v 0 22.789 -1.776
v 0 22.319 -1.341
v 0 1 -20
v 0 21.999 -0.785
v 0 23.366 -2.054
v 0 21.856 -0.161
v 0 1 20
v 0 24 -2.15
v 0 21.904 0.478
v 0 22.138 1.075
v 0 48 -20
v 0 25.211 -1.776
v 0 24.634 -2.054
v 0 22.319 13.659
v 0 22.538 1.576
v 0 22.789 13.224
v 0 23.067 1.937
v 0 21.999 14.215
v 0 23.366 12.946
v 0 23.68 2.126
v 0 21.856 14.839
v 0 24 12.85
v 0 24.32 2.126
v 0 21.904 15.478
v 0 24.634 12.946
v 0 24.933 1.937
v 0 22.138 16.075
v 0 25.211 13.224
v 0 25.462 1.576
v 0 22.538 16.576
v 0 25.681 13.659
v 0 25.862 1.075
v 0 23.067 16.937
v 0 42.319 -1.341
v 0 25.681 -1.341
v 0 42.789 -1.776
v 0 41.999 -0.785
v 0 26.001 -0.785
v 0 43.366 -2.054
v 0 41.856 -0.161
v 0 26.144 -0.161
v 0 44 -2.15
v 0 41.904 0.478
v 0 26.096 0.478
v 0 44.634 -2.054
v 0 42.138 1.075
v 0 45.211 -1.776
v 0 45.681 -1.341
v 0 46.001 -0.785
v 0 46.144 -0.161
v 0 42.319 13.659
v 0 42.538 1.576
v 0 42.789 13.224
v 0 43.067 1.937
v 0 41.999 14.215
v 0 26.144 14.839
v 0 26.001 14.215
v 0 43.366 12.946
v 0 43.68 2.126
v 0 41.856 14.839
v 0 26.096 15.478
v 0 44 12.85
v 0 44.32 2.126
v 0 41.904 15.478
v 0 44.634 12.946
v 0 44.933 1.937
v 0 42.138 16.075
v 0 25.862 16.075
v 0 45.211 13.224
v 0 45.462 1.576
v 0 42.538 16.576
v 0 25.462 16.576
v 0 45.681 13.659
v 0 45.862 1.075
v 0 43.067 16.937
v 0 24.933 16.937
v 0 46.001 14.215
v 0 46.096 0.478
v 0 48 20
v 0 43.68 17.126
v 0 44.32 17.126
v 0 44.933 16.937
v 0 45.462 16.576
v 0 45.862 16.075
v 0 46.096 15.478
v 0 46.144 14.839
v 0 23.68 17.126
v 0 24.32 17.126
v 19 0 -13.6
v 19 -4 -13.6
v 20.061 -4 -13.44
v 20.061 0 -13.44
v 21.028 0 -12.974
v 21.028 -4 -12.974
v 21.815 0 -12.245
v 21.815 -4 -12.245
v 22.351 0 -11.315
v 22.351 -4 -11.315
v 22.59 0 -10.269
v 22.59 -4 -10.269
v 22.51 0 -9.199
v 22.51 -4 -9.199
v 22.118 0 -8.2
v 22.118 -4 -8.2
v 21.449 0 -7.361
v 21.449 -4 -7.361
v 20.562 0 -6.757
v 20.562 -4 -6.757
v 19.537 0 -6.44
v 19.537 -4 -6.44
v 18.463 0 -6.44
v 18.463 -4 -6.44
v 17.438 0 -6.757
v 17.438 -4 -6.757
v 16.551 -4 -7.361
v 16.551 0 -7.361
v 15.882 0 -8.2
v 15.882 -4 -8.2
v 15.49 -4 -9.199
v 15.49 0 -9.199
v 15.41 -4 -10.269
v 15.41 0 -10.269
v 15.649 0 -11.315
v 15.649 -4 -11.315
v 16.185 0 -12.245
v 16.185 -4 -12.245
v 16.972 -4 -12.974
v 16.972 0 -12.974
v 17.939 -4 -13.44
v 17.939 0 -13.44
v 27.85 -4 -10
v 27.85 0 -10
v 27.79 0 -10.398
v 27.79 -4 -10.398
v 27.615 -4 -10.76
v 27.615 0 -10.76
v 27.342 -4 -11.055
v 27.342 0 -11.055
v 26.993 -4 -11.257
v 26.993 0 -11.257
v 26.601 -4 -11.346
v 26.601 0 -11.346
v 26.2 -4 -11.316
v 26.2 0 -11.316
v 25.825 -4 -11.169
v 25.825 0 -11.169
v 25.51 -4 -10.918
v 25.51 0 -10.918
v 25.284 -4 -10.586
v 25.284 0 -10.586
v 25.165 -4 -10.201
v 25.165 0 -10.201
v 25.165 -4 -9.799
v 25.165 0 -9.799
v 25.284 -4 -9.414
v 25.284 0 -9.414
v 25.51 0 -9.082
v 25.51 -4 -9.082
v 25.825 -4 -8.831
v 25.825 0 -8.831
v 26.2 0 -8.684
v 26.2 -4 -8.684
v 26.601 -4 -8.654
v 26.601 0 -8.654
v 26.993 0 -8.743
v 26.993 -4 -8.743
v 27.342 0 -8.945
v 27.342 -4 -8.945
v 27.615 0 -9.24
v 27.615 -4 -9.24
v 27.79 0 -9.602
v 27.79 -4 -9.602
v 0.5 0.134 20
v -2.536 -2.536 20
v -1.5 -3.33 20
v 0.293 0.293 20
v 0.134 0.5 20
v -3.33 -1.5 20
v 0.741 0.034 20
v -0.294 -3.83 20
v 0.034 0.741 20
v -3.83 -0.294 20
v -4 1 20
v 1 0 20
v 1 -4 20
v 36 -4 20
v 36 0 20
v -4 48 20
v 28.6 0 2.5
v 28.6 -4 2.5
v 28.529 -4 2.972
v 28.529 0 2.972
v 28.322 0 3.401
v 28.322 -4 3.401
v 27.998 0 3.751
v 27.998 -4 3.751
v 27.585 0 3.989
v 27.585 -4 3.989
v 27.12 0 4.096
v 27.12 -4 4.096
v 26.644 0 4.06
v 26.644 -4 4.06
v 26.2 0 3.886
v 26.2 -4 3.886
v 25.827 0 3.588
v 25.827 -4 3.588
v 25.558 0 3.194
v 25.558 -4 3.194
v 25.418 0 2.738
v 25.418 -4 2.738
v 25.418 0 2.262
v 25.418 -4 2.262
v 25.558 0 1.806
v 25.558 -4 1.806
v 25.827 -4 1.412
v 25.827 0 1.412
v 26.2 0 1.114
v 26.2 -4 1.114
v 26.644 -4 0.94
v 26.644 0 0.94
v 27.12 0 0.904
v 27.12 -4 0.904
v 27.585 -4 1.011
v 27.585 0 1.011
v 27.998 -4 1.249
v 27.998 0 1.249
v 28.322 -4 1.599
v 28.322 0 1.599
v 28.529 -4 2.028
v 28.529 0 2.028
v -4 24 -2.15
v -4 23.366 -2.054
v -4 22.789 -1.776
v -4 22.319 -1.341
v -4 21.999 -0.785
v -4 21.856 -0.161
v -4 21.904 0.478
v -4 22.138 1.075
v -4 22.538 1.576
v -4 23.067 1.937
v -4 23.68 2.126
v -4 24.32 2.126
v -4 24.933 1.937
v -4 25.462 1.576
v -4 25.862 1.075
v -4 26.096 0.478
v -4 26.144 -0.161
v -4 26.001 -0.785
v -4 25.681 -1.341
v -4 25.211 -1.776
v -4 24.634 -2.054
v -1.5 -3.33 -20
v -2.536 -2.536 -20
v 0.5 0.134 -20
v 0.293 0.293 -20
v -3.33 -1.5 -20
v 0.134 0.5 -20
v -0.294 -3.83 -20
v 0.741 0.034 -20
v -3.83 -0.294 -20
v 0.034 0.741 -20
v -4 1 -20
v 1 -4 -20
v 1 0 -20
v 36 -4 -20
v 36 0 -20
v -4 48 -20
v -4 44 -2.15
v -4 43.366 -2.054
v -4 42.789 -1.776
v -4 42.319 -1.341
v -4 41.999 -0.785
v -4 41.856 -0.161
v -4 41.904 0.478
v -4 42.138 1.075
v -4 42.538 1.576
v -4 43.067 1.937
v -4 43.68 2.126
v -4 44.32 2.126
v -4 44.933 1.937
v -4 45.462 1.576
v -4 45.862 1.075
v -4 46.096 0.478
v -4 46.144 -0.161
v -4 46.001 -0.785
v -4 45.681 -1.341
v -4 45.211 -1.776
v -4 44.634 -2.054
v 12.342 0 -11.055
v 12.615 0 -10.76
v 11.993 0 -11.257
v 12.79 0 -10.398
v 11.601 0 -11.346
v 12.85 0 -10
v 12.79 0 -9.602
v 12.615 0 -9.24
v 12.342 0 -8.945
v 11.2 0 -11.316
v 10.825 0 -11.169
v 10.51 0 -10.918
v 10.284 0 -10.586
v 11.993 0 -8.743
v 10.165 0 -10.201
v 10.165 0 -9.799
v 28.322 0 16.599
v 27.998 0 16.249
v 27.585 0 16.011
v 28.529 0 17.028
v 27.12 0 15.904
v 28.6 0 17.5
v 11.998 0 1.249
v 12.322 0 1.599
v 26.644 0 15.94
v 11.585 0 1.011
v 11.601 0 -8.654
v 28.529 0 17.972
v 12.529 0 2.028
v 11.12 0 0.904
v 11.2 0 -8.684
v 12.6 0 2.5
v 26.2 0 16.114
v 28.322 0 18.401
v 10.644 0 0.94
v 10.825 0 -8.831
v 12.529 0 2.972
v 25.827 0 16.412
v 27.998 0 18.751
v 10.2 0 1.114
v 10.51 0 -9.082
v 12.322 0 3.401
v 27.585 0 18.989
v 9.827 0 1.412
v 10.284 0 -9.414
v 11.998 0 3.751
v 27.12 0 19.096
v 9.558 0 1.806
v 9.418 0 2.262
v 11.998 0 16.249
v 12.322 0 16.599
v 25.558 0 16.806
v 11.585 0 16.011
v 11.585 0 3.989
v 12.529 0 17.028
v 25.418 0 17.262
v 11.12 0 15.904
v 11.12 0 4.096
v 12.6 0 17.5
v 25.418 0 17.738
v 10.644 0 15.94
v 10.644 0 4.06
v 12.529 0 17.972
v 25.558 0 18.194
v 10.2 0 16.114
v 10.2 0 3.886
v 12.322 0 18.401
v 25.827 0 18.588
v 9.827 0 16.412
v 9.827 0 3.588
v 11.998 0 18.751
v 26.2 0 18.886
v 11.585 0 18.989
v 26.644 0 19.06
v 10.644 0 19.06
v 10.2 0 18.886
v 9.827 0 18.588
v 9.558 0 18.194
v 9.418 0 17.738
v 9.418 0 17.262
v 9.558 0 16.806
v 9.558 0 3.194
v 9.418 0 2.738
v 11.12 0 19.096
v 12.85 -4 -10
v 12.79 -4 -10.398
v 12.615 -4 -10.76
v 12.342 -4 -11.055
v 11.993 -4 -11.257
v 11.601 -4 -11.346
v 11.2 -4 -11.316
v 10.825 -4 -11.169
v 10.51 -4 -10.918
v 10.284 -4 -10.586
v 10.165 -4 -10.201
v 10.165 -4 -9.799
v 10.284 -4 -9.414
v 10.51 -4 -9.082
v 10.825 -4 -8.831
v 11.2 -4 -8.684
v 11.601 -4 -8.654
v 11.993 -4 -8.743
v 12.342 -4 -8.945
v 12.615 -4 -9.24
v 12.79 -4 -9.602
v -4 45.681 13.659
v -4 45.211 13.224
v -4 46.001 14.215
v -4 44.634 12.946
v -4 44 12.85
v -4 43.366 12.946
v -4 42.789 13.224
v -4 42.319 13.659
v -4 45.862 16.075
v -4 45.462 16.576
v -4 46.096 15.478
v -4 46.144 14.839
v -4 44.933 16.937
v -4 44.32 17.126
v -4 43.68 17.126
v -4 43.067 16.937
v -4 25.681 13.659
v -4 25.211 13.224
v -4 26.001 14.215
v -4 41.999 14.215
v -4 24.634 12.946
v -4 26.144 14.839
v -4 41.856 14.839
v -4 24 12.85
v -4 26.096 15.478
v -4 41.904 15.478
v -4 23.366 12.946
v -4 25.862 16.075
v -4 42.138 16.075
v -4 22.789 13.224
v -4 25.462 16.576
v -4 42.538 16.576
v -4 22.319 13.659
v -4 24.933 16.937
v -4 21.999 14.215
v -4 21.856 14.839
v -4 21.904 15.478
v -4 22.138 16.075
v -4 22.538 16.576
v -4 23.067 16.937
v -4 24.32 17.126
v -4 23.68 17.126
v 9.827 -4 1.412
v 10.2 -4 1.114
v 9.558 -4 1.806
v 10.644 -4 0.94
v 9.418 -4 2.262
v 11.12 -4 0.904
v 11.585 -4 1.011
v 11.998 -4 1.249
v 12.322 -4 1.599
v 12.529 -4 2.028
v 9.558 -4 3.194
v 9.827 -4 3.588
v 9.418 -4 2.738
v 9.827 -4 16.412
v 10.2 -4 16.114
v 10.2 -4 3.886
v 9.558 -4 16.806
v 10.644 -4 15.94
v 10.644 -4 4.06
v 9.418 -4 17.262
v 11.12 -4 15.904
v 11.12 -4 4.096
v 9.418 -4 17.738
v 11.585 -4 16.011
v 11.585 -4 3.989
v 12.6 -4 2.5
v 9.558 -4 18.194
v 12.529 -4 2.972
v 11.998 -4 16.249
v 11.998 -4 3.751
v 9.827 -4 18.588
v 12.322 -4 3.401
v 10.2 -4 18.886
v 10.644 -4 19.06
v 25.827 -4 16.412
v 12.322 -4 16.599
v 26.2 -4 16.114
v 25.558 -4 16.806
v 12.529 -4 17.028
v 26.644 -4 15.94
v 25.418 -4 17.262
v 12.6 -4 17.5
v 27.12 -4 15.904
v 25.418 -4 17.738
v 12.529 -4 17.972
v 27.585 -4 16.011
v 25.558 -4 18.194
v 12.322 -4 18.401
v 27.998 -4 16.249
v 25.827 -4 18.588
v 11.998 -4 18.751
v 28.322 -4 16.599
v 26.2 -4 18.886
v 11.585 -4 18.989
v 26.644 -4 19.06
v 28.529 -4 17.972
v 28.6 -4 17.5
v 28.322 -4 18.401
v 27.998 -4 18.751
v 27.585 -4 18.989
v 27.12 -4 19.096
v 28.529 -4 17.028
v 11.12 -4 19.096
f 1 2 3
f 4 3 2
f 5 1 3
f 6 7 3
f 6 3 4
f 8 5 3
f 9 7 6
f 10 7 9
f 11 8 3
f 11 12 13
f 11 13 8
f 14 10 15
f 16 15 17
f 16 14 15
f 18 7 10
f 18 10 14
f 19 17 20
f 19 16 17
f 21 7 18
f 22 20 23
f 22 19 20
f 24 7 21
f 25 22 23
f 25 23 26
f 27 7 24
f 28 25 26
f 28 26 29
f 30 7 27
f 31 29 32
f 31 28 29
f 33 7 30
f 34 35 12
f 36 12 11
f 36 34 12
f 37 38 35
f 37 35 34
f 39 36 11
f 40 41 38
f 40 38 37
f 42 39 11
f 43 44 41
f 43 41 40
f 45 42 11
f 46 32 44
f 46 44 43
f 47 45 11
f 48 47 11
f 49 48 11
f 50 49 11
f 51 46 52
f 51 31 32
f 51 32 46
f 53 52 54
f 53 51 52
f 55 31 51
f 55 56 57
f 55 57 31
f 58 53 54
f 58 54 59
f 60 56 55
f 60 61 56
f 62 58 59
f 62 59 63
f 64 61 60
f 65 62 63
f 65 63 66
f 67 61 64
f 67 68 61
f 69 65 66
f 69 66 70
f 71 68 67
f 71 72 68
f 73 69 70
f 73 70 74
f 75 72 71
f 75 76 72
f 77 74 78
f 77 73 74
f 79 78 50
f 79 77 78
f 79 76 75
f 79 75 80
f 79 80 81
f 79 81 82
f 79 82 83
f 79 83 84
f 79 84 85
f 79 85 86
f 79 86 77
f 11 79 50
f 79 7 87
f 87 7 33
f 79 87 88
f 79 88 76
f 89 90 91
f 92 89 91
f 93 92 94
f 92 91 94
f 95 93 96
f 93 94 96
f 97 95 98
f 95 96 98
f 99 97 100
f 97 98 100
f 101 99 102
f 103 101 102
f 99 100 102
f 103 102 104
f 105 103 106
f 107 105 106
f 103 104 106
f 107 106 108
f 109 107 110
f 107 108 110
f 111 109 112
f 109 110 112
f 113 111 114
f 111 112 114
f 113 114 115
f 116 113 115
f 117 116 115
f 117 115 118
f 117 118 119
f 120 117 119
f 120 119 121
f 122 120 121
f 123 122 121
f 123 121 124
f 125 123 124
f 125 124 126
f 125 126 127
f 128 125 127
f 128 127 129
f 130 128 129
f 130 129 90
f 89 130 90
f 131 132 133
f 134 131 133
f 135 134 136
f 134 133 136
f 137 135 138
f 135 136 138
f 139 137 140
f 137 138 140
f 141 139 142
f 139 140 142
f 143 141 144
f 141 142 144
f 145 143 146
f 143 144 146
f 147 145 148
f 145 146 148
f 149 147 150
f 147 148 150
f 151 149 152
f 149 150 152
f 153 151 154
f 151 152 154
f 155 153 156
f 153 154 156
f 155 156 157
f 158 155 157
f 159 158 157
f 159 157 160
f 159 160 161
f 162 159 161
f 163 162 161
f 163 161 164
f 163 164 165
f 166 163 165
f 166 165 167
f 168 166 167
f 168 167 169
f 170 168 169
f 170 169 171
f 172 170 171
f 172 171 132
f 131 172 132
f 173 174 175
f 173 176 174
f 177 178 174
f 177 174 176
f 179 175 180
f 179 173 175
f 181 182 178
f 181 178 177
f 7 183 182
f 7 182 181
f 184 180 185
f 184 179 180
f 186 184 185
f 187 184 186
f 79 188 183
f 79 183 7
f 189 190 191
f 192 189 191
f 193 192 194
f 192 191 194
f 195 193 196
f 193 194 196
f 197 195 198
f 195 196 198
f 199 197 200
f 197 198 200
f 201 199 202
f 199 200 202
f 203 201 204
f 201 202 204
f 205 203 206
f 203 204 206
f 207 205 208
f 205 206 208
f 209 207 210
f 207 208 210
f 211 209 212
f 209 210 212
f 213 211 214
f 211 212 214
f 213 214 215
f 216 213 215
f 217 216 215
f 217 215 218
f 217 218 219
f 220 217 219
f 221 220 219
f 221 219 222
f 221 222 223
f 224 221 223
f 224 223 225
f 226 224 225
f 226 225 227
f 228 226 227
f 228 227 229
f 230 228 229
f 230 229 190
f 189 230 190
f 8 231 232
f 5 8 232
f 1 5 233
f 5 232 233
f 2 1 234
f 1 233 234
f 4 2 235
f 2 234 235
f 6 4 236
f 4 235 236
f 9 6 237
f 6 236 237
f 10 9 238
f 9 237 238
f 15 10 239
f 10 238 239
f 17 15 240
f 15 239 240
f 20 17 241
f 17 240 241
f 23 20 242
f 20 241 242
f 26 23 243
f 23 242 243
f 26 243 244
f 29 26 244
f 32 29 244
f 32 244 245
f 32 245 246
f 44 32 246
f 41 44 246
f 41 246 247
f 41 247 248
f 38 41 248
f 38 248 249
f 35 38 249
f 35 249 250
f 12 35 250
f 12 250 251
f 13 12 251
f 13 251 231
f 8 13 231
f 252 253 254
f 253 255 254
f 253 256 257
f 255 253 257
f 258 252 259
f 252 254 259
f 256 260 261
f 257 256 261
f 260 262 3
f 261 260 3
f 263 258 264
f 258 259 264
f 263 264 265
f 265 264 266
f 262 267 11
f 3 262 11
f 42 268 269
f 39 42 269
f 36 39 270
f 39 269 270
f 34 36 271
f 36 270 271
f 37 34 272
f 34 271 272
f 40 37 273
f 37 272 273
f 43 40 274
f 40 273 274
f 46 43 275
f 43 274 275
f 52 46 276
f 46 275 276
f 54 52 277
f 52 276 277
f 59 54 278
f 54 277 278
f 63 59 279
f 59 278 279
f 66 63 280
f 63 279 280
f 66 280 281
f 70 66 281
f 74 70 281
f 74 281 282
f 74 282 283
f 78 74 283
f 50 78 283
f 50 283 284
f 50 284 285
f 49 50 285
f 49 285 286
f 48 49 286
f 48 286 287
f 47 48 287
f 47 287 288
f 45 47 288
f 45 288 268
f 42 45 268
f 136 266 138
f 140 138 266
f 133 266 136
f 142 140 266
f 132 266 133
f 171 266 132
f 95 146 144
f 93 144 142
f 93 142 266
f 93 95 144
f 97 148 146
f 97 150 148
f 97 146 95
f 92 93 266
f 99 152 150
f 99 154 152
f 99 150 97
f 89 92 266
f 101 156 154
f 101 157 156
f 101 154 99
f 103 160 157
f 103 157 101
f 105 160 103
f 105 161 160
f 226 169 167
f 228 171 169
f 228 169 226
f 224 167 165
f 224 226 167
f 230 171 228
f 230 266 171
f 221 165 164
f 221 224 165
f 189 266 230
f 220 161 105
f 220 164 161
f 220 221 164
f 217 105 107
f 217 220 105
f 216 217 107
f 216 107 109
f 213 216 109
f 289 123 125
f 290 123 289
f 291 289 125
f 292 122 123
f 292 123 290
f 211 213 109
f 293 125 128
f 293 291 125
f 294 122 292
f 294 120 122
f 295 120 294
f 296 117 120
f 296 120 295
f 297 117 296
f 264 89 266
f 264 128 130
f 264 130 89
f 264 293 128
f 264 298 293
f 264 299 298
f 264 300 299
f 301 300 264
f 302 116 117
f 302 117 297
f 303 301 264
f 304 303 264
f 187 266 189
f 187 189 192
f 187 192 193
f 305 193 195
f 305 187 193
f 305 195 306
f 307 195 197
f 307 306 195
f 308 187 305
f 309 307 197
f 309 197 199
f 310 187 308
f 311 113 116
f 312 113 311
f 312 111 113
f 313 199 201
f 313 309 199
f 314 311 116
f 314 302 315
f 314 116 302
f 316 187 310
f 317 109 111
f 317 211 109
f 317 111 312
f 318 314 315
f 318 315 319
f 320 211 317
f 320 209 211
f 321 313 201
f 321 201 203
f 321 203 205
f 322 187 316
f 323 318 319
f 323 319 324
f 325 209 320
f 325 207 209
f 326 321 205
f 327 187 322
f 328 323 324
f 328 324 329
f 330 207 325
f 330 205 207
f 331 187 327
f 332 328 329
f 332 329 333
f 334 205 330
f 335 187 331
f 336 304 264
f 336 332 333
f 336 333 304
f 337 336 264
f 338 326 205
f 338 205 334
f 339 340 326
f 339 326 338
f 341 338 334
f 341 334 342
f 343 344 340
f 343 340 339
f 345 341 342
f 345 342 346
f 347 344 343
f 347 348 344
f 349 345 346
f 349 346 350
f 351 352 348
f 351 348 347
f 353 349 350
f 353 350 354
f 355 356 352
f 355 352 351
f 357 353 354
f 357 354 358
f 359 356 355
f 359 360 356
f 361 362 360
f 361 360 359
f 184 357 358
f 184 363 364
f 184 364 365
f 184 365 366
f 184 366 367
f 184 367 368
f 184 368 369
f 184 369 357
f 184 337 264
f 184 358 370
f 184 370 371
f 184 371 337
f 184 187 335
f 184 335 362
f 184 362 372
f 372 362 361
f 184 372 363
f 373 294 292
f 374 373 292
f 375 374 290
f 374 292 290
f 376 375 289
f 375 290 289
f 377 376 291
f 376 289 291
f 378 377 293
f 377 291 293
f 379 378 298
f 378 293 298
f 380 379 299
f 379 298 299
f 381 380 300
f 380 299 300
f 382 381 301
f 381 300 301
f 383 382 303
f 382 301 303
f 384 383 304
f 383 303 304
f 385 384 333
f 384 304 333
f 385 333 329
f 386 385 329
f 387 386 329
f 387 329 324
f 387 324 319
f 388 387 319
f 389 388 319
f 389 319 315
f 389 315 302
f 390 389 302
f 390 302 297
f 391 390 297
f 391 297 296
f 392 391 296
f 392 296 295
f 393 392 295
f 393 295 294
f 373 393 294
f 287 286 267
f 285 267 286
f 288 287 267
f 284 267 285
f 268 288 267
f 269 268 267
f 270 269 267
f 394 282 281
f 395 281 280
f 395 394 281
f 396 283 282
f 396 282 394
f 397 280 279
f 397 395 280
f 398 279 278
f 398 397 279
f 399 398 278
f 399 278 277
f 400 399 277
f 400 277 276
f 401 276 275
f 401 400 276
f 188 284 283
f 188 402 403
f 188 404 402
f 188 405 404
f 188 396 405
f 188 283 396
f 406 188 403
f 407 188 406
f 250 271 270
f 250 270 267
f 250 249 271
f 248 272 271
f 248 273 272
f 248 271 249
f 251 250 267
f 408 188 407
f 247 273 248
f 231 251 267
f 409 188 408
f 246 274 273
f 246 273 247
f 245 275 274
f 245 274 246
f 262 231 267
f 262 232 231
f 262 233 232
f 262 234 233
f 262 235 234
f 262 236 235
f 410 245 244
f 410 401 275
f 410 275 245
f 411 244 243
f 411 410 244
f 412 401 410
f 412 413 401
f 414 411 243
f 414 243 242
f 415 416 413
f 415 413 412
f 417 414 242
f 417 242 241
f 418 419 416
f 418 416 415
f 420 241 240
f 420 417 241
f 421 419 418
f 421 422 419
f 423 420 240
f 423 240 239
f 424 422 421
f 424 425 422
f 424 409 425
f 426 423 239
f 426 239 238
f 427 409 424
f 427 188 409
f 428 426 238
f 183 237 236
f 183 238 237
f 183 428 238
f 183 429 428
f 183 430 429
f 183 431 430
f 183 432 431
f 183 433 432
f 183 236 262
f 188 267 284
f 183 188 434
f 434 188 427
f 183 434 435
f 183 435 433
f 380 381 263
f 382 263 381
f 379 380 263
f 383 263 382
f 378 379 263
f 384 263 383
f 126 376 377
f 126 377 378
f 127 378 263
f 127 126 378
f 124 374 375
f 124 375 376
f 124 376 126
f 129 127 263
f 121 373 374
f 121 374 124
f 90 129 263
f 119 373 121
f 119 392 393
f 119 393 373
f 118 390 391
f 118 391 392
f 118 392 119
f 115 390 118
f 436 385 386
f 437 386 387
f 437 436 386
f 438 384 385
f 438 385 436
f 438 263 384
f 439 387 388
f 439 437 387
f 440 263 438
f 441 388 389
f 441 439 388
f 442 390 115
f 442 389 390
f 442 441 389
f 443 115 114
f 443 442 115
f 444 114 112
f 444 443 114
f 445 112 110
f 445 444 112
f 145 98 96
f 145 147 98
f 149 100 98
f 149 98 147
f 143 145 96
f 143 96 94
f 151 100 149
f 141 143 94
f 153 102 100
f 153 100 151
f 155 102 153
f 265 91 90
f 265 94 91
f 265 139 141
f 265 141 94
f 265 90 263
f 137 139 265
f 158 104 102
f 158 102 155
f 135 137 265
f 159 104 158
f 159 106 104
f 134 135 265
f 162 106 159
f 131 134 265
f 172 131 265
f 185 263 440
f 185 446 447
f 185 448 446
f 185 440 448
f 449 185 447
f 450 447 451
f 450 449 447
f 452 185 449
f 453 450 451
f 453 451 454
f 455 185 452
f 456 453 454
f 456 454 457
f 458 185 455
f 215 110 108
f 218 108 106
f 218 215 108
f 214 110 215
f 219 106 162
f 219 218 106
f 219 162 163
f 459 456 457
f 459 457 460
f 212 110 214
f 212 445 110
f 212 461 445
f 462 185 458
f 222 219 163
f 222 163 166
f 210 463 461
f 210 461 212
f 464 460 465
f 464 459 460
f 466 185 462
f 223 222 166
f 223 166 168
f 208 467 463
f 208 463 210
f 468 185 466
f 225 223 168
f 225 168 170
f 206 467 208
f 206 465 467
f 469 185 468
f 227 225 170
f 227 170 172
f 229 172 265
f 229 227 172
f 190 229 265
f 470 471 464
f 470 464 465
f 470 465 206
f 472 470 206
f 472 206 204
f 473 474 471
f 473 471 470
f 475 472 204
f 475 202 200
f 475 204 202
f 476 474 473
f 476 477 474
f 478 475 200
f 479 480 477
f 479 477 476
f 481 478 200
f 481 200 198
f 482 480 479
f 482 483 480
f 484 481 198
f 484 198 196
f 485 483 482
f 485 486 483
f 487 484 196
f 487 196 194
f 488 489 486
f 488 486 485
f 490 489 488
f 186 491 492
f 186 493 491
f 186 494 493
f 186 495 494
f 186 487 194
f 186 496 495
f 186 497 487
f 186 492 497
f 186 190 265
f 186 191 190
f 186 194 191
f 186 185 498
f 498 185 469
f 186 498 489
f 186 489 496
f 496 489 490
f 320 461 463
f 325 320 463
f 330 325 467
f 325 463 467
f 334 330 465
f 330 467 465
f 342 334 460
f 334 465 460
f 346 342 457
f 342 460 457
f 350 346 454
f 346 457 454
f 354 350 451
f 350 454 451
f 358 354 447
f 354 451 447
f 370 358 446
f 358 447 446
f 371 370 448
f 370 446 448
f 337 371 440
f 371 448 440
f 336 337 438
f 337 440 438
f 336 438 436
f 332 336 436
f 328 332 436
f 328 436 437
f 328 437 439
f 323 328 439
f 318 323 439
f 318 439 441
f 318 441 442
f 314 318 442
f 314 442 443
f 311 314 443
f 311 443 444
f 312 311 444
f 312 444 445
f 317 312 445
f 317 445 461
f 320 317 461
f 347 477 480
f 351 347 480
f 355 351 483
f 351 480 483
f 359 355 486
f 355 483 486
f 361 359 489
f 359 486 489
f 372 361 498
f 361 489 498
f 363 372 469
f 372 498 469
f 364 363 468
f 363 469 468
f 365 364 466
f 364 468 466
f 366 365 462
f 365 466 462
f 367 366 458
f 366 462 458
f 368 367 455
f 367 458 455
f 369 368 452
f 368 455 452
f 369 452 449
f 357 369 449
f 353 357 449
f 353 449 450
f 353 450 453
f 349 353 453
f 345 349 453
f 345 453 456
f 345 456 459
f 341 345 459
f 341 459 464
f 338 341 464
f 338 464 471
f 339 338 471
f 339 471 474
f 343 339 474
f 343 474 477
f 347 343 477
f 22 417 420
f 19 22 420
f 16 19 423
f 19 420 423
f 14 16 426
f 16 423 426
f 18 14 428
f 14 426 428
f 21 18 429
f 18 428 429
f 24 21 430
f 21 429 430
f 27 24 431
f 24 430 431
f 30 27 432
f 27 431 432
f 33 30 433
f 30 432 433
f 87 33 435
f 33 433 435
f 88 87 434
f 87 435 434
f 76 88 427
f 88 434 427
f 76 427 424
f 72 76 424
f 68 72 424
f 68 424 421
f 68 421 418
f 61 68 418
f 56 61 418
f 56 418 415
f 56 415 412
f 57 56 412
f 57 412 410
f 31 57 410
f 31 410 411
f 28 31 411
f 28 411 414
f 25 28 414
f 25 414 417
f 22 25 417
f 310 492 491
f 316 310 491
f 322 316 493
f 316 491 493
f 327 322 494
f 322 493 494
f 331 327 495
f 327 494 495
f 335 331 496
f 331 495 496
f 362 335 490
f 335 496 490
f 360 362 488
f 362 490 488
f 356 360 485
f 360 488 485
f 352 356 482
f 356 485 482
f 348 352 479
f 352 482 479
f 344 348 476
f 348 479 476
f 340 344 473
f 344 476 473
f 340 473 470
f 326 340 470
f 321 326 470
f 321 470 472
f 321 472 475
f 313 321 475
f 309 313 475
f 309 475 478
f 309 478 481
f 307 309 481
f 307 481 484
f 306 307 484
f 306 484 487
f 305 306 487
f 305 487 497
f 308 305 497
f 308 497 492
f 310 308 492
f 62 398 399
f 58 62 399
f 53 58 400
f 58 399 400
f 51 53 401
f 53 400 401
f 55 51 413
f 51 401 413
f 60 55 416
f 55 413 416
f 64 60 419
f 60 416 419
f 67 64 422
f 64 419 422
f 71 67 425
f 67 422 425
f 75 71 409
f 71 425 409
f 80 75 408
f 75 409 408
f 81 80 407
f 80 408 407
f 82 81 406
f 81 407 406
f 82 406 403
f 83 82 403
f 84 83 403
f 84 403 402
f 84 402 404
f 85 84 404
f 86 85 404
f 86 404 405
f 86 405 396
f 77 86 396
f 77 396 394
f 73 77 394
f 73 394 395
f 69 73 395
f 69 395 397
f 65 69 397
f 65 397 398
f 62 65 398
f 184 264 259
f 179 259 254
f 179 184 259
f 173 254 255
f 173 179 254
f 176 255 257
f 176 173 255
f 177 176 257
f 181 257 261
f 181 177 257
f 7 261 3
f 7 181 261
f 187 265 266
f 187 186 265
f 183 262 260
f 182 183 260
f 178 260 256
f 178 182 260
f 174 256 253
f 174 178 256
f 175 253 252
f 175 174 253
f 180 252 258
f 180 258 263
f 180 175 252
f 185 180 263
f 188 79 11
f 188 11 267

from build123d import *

# Parameters (mm, degrees)
SM_BASE_FLANGE_2_DEPTH = 20
HOLE_WIZARD_M3_1_D     = 3.2
SKETCH_24_R            = 3.6
CUT_EXTRUDE_2_DEPTH    = 67.332495807
HOLE_WIZARD_M4_1_D     = 4.3
HOLE_WIZARD_M2_5_1_D   = 2.7


# Sheet-metal steps are written as plain solids
with BuildPart() as part:
    # 草圖16 → 基材-凸緣2 (new, symmetric)
    with BuildSketch(Plane.XY):
        with BuildLine():
            Line((36, 0), (1, 0))
            ThreePointArc((1, 0), (0.292893219, 0.292893219), (0, 1))
            Line((0, 1), (0, 48))
            Line((0, 48), (-4, 48))
            Line((-4, 48), (-4, 1))
            ThreePointArc((-4, 1), (-2.535533906, -2.535533906), (1, -4))
            Line((1, -4), (36, -4))
            Line((36, -4), (36, 0))
        make_face()
    extrude(amount=SM_BASE_FLANGE_2_DEPTH, both=True)

    # M3 餘隙孔1 (through all)
    with Locations(Plane(origin=(0, 0, 0), x_dir=(-1, 0, 0), z_dir=(0, 1, 0))):
        with Locations((-27, 17.5), (-11, 2.5), (-11, 17.5), (-27, 2.5)):
            Hole(HOLE_WIZARD_M3_1_D / 2)

    # 草圖24 → 除料-伸長2 (cut, through all)
    with BuildSketch(Plane.XZ.offset(4)):
        with Locations(Location((19, -10, 0), (0, 0, 270))):
            Circle(SKETCH_24_R)
    extrude(amount=-CUT_EXTRUDE_2_DEPTH, mode=Mode.SUBTRACT)

    # M4 餘隙孔1 (through all)
    with Locations(Plane(origin=(0, 0, 0), x_dir=(0, 0, 1), z_dir=(1, 0, 0))):
        with Locations((0, -44), (15, -44), (15, -24), (0, -24)):
            Hole(HOLE_WIZARD_M4_1_D / 2)

    # M2.5 餘隙孔1 (through all)
    with Locations(Plane(origin=(0, -4, 0), x_dir=(-1, 0, 0), z_dir=(0, -1, 0))):
        with Locations((-11.5, 10), (-26.5, 10)):
            Hole(HOLE_WIZARD_M2_5_1_D / 2)


solid = part.part
